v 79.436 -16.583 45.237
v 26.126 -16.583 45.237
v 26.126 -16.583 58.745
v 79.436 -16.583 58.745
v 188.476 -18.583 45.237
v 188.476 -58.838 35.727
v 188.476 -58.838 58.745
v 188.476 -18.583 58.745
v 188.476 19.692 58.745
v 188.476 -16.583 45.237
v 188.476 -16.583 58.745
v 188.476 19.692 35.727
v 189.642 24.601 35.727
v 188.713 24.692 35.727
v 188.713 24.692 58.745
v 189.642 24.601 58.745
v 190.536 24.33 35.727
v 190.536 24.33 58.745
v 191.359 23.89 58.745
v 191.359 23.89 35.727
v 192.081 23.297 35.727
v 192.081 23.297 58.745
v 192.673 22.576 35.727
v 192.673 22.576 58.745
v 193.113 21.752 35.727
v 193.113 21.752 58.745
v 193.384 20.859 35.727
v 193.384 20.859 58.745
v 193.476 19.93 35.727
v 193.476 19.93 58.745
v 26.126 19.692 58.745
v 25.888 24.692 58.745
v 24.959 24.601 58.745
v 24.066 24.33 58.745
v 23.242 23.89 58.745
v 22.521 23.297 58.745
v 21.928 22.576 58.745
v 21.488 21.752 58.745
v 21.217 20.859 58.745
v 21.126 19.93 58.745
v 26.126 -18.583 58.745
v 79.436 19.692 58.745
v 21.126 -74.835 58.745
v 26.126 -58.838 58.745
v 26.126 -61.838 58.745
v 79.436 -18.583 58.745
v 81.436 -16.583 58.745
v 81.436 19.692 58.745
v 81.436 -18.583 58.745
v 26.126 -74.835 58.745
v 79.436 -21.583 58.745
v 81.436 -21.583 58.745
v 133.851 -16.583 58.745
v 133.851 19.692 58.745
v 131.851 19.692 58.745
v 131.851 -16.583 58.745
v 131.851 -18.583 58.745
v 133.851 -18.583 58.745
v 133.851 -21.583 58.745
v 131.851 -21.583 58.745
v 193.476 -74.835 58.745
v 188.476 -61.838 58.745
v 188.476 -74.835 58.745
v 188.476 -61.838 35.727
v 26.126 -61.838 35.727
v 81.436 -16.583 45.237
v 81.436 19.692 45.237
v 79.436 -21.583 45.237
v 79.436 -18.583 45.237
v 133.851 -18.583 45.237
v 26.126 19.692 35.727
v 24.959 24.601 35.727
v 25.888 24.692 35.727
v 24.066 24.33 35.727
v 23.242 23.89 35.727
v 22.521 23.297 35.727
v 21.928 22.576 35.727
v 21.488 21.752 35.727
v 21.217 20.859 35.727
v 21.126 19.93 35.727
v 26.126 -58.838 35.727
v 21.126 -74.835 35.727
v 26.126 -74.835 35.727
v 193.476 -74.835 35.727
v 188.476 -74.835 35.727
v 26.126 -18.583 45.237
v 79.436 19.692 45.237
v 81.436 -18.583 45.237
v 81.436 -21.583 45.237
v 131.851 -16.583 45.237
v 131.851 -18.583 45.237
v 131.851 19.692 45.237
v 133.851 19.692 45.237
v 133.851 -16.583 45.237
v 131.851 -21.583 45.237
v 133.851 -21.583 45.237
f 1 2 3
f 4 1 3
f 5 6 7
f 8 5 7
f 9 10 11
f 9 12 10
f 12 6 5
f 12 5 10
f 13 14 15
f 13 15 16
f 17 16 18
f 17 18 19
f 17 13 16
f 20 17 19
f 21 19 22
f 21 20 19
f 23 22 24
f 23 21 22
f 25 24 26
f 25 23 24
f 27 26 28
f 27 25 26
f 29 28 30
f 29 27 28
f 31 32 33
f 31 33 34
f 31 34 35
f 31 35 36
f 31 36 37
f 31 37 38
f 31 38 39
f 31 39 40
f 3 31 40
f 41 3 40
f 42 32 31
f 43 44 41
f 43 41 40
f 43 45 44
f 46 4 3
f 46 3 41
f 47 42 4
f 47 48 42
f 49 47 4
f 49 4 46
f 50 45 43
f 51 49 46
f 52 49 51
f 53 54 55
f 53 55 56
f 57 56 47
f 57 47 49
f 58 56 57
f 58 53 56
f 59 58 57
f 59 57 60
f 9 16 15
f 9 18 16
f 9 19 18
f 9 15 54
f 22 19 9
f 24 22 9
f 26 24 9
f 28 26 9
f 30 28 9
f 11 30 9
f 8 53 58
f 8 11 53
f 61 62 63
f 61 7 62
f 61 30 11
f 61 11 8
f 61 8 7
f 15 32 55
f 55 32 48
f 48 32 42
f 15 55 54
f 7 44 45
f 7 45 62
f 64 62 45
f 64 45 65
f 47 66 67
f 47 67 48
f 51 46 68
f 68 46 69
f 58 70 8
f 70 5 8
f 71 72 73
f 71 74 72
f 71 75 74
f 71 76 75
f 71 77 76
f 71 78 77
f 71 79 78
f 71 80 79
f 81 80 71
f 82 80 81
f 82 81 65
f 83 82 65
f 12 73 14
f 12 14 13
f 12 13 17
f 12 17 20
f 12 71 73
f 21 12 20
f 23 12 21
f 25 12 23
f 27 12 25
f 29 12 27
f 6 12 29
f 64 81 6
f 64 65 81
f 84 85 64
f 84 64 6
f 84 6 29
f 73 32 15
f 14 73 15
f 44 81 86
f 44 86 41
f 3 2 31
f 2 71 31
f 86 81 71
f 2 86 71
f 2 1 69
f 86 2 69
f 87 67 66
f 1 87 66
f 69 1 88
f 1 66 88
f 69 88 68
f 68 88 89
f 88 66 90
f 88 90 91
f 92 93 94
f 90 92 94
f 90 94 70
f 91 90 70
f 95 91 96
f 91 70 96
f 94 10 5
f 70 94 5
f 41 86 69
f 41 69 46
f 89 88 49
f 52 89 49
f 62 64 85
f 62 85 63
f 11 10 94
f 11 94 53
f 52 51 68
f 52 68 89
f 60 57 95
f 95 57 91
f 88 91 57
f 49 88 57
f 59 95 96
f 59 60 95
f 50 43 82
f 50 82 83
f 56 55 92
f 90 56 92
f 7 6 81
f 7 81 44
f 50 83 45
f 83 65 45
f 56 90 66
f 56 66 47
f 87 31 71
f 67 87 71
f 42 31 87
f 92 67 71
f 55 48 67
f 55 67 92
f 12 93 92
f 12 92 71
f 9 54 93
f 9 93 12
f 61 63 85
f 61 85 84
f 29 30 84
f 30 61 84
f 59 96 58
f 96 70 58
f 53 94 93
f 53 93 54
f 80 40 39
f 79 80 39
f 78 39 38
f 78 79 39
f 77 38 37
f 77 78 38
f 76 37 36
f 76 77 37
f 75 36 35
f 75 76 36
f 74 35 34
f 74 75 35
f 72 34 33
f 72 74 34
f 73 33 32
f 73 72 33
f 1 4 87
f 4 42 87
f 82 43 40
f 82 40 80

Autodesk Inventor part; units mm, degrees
ref_plane "YZ Plane" through (0, 0, 0) normal (1, 0, 0) x (0, 1, 0)
ref_plane "XZ Plane" through (0, 0, 0) normal (0, 1, 0) x (-1, 0, 0)
ref_plane "XY Plane" through (0, 0, 0) normal (0, 0, 1) x (1, 0, 0)
ref_plane "boardTop(tolerance)" through (29.1257, 19.6924, 40.7272) normal (0, -1, 0) x (1, 0, 0)
sketch "Sketch3" plane through (29.1257, 19.6924, 40.7272) normal (0, -1, 0) x (1, 0, 0)
  line L0 (-2, 1.51) -> (-2, 0)
  line L1 (158.35, 0) -> (158.35, 1.51)
  line L2 (-8, 18.0177) -> (-8, -5)
  line L3 (164.35, 18.0177) -> (164.35, -5)
  line L4 (164.35, 18.0177) -> (-8, 18.0177)
  line L5 (-8, -5) -> (164.35, -5)
  point P0 (-29.1257, -40.7272)
  point P1 (158.35, 0.755)
  dimension "d12" = 6
  dimension "d13" = 6
extrude "Extrusion3" add sketch "Sketch3" against normal blind 5
ref_plane "boardBottom(tolerance)" through (185.4757, -59.8376, 42.2372) normal (0, -1, 0) x (-1, 0, 0)
sketch "Sketch4" plane through (29.1257, 19.6924, 40.7272) normal (0, -1, 0) x (1, 0, 0)
  line L0 (-2, 1.51) -> (-2, 0)
  line L1 (158.35, 1.51) -> (158.35, 0)
  line L2 (-8, 18.0177) -> (-8, -5) projected
  line L3 (-8, -5) -> (164.35, -5) projected
  line L4 (164.35, -5) -> (164.35, 18.0177) projected
  line L5 (164.35, 18.0177) -> (-8, 18.0177) projected
  line L6 (159.35, -5) -> (159.35, 18.0177)
  line L7 (-8, 18.0177) -> (164.35, 18.0177) projected
  line L8 (-3, -5) -> (-3, 18.0177)
  point P0 (-29.1257, -40.7272)
  point P1 (158.35, 0.755)
  point P2 (-2, 0.755)
  point P3 (-3, 18.0177)
  dimension "d17" = 1
  dimension "d18" = 1
extrude "Extrusion4" add sketch "Sketch4" along normal blind 94.5274 contours L5 L8 L3 L2 | L5 L4 L3 L6
ref_plane "boardRight(tolerance)" through (188.4757, 19.6924, 35.7272) normal (-1, 0, 0) x (0, -1, 0)
sketch "Sketch5" plane through (188.4757, -74.835, 35.7272) normal (-1, 0, 0) x (0, 0, 1)
  line L0 (5, 15.9974) -> (6.51, 15.9974) projected
  line L1 (0, 94.5274) -> (23.0177, 94.5274) projected
  line L2 (0, 94.5274) -> (0, 0) projected
  line L3 (23.0177, 0) -> (0, 0) projected
  line L4 (23.0177, 94.5274) -> (23.0177, 0) projected
  line L5 (0, 94.5274) -> (0, 0) projected
  line L6 (0, 15.9974) -> (23.0177, 15.9974)
  line L7 (23.0177, 15.9974) -> (23.0177, 12.9974)
  line L8 (23.0177, 12.9974) -> (0, 12.9974)
  line L9 (0, 12.9974) -> (0, 15.9974)
  point P0 (-35.7272, 74.835)
  point P1 (0, 12.9974)
  point P2 (6.51, 15.9974)
  dimension "d21" = 3
ref_plane "boardLeft(tolerance)" through (26.1257, 19.6924, 58.7449) normal (1, 0, 0) x (0, -1, 0)
extrude "Extrusion5" add sketch "Sketch5" along normal up to surface (162.35 mm away) contours L0 L6 L4 L8 L2
sketch "Sketch6" plane through (29.1257, 19.6924, 40.7272) normal (0, -1, 0) x (1, 0, 0)
  line L0 (48.3131, 6.295) -> (48.54, 4.395) projected
  line L1 (54.3069, 2.495) -> (54.08, 4.395) projected
  line L2 (99.8531, 6.295) -> (100.08, 4.395) projected
  line L3 (107.5969, 2.495) -> (107.37, 4.395) projected
  line L4 (-3, 18.0177) -> (-3, -5) projected
  line L5 (-3, -5) -> (159.35, -5) projected
  line L6 (159.35, -5) -> (159.35, 18.0177) projected
  line L7 (159.35, 18.0177) -> (-3, 18.0177) projected
  line L8 (0, 1.51) -> (156.35, 1.51) projected
  line L9 (102.725, 1.51) -> (104.725, 1.51)
  line L10 (104.725, 1.51) -> (104.725, 18.0177)
  line L11 (104.725, 18.0177) -> (102.725, 18.0177)
  line L12 (102.725, 18.0177) -> (102.725, 1.51)
  line L13 (159.35, 18.0177) -> (-3, 18.0177) projected
  line L14 (50.31, 1.51) -> (52.31, 1.51)
  line L15 (52.31, 1.51) -> (52.31, 18.0177)
  line L16 (52.31, 18.0177) -> (50.31, 18.0177)
  line L17 (50.31, 18.0177) -> (50.31, 1.51)
  line L18 (48.4266, 5.345) -> (50.31, 5.345) construction
  line L19 (54.1934, 3.445) -> (52.31, 3.445) construction
  line L20 (99.9666, 5.345) -> (102.725, 5.345) construction
  line L21 (107.4834, 3.445) -> (104.725, 3.445) construction
  point P0 (-29.1257, -40.7272)
  point P1 (124.6421, 15.795)
  dimension "d31" = 2
  dimension "d32" = 2
extrude "Extrusion6" add sketch "Sketch6" along normal blind 41.275 contours L7 L15 L8 L17 | L7 L10 L8 L12
sketch "Sketch7" plane through (133.8507, 19.6924, 42.2372) normal (0, 0, -1) x (-1, 0, 0)
  line L0 (2, 0) -> (2, -41.275) projected
  line L1 (0, 0) -> (0, -41.275) projected
  line L2 (2, -41.275) -> (0, -41.275) projected
  line L3 (54.415, 0) -> (54.415, -41.275) projected
  line L4 (52.415, 0) -> (52.415, -41.275) projected
  line L5 (54.415, -41.275) -> (52.415, -41.275) projected
  line L6 (0, 0) -> (2, 0)
  line L7 (54.415, 0) -> (52.415, 0)
  point P0 (133.8507, -19.6924)
extrude "Extrusion7" cut sketch "Sketch7" against normal blind 3
sketch "Sketch9" plane through (188.4757, 19.6924, 35.7272) normal (-1, 0, 0) x (0, 0, 1)
  line L0 (23.0177, 0) -> (23.0177, -41.275) projected
  line L1 (23.0177, -41.275) -> (9.51, -41.275) projected
  line L2 (9.51, 0) -> (9.51, -41.275) projected
  line L3 (9.51, -38.275) -> (23.0177, -38.275)
  line L4 (23.0177, 0) -> (23.0177, -78.53) projected
  line L5 (9.51, -36.275) -> (23.0177, -36.275)
  point P0 (-35.7272, -19.6924)
  point P1 (23.0177, -36.275)
  point P2 (23.0177, -38.275)
  dimension "d35" = 3
  dimension "d37" = 2
extrude "Extrusion8" add sketch "Sketch9" along normal up to surface (162.35 mm away) contours L0 L3 L2 L5
fillet "Fillet1" radius 4.7625 2 edges at (21.1257, 24.6924, 47.236) (193.4757, 24.6924, 47.236)
properties part number "case"
